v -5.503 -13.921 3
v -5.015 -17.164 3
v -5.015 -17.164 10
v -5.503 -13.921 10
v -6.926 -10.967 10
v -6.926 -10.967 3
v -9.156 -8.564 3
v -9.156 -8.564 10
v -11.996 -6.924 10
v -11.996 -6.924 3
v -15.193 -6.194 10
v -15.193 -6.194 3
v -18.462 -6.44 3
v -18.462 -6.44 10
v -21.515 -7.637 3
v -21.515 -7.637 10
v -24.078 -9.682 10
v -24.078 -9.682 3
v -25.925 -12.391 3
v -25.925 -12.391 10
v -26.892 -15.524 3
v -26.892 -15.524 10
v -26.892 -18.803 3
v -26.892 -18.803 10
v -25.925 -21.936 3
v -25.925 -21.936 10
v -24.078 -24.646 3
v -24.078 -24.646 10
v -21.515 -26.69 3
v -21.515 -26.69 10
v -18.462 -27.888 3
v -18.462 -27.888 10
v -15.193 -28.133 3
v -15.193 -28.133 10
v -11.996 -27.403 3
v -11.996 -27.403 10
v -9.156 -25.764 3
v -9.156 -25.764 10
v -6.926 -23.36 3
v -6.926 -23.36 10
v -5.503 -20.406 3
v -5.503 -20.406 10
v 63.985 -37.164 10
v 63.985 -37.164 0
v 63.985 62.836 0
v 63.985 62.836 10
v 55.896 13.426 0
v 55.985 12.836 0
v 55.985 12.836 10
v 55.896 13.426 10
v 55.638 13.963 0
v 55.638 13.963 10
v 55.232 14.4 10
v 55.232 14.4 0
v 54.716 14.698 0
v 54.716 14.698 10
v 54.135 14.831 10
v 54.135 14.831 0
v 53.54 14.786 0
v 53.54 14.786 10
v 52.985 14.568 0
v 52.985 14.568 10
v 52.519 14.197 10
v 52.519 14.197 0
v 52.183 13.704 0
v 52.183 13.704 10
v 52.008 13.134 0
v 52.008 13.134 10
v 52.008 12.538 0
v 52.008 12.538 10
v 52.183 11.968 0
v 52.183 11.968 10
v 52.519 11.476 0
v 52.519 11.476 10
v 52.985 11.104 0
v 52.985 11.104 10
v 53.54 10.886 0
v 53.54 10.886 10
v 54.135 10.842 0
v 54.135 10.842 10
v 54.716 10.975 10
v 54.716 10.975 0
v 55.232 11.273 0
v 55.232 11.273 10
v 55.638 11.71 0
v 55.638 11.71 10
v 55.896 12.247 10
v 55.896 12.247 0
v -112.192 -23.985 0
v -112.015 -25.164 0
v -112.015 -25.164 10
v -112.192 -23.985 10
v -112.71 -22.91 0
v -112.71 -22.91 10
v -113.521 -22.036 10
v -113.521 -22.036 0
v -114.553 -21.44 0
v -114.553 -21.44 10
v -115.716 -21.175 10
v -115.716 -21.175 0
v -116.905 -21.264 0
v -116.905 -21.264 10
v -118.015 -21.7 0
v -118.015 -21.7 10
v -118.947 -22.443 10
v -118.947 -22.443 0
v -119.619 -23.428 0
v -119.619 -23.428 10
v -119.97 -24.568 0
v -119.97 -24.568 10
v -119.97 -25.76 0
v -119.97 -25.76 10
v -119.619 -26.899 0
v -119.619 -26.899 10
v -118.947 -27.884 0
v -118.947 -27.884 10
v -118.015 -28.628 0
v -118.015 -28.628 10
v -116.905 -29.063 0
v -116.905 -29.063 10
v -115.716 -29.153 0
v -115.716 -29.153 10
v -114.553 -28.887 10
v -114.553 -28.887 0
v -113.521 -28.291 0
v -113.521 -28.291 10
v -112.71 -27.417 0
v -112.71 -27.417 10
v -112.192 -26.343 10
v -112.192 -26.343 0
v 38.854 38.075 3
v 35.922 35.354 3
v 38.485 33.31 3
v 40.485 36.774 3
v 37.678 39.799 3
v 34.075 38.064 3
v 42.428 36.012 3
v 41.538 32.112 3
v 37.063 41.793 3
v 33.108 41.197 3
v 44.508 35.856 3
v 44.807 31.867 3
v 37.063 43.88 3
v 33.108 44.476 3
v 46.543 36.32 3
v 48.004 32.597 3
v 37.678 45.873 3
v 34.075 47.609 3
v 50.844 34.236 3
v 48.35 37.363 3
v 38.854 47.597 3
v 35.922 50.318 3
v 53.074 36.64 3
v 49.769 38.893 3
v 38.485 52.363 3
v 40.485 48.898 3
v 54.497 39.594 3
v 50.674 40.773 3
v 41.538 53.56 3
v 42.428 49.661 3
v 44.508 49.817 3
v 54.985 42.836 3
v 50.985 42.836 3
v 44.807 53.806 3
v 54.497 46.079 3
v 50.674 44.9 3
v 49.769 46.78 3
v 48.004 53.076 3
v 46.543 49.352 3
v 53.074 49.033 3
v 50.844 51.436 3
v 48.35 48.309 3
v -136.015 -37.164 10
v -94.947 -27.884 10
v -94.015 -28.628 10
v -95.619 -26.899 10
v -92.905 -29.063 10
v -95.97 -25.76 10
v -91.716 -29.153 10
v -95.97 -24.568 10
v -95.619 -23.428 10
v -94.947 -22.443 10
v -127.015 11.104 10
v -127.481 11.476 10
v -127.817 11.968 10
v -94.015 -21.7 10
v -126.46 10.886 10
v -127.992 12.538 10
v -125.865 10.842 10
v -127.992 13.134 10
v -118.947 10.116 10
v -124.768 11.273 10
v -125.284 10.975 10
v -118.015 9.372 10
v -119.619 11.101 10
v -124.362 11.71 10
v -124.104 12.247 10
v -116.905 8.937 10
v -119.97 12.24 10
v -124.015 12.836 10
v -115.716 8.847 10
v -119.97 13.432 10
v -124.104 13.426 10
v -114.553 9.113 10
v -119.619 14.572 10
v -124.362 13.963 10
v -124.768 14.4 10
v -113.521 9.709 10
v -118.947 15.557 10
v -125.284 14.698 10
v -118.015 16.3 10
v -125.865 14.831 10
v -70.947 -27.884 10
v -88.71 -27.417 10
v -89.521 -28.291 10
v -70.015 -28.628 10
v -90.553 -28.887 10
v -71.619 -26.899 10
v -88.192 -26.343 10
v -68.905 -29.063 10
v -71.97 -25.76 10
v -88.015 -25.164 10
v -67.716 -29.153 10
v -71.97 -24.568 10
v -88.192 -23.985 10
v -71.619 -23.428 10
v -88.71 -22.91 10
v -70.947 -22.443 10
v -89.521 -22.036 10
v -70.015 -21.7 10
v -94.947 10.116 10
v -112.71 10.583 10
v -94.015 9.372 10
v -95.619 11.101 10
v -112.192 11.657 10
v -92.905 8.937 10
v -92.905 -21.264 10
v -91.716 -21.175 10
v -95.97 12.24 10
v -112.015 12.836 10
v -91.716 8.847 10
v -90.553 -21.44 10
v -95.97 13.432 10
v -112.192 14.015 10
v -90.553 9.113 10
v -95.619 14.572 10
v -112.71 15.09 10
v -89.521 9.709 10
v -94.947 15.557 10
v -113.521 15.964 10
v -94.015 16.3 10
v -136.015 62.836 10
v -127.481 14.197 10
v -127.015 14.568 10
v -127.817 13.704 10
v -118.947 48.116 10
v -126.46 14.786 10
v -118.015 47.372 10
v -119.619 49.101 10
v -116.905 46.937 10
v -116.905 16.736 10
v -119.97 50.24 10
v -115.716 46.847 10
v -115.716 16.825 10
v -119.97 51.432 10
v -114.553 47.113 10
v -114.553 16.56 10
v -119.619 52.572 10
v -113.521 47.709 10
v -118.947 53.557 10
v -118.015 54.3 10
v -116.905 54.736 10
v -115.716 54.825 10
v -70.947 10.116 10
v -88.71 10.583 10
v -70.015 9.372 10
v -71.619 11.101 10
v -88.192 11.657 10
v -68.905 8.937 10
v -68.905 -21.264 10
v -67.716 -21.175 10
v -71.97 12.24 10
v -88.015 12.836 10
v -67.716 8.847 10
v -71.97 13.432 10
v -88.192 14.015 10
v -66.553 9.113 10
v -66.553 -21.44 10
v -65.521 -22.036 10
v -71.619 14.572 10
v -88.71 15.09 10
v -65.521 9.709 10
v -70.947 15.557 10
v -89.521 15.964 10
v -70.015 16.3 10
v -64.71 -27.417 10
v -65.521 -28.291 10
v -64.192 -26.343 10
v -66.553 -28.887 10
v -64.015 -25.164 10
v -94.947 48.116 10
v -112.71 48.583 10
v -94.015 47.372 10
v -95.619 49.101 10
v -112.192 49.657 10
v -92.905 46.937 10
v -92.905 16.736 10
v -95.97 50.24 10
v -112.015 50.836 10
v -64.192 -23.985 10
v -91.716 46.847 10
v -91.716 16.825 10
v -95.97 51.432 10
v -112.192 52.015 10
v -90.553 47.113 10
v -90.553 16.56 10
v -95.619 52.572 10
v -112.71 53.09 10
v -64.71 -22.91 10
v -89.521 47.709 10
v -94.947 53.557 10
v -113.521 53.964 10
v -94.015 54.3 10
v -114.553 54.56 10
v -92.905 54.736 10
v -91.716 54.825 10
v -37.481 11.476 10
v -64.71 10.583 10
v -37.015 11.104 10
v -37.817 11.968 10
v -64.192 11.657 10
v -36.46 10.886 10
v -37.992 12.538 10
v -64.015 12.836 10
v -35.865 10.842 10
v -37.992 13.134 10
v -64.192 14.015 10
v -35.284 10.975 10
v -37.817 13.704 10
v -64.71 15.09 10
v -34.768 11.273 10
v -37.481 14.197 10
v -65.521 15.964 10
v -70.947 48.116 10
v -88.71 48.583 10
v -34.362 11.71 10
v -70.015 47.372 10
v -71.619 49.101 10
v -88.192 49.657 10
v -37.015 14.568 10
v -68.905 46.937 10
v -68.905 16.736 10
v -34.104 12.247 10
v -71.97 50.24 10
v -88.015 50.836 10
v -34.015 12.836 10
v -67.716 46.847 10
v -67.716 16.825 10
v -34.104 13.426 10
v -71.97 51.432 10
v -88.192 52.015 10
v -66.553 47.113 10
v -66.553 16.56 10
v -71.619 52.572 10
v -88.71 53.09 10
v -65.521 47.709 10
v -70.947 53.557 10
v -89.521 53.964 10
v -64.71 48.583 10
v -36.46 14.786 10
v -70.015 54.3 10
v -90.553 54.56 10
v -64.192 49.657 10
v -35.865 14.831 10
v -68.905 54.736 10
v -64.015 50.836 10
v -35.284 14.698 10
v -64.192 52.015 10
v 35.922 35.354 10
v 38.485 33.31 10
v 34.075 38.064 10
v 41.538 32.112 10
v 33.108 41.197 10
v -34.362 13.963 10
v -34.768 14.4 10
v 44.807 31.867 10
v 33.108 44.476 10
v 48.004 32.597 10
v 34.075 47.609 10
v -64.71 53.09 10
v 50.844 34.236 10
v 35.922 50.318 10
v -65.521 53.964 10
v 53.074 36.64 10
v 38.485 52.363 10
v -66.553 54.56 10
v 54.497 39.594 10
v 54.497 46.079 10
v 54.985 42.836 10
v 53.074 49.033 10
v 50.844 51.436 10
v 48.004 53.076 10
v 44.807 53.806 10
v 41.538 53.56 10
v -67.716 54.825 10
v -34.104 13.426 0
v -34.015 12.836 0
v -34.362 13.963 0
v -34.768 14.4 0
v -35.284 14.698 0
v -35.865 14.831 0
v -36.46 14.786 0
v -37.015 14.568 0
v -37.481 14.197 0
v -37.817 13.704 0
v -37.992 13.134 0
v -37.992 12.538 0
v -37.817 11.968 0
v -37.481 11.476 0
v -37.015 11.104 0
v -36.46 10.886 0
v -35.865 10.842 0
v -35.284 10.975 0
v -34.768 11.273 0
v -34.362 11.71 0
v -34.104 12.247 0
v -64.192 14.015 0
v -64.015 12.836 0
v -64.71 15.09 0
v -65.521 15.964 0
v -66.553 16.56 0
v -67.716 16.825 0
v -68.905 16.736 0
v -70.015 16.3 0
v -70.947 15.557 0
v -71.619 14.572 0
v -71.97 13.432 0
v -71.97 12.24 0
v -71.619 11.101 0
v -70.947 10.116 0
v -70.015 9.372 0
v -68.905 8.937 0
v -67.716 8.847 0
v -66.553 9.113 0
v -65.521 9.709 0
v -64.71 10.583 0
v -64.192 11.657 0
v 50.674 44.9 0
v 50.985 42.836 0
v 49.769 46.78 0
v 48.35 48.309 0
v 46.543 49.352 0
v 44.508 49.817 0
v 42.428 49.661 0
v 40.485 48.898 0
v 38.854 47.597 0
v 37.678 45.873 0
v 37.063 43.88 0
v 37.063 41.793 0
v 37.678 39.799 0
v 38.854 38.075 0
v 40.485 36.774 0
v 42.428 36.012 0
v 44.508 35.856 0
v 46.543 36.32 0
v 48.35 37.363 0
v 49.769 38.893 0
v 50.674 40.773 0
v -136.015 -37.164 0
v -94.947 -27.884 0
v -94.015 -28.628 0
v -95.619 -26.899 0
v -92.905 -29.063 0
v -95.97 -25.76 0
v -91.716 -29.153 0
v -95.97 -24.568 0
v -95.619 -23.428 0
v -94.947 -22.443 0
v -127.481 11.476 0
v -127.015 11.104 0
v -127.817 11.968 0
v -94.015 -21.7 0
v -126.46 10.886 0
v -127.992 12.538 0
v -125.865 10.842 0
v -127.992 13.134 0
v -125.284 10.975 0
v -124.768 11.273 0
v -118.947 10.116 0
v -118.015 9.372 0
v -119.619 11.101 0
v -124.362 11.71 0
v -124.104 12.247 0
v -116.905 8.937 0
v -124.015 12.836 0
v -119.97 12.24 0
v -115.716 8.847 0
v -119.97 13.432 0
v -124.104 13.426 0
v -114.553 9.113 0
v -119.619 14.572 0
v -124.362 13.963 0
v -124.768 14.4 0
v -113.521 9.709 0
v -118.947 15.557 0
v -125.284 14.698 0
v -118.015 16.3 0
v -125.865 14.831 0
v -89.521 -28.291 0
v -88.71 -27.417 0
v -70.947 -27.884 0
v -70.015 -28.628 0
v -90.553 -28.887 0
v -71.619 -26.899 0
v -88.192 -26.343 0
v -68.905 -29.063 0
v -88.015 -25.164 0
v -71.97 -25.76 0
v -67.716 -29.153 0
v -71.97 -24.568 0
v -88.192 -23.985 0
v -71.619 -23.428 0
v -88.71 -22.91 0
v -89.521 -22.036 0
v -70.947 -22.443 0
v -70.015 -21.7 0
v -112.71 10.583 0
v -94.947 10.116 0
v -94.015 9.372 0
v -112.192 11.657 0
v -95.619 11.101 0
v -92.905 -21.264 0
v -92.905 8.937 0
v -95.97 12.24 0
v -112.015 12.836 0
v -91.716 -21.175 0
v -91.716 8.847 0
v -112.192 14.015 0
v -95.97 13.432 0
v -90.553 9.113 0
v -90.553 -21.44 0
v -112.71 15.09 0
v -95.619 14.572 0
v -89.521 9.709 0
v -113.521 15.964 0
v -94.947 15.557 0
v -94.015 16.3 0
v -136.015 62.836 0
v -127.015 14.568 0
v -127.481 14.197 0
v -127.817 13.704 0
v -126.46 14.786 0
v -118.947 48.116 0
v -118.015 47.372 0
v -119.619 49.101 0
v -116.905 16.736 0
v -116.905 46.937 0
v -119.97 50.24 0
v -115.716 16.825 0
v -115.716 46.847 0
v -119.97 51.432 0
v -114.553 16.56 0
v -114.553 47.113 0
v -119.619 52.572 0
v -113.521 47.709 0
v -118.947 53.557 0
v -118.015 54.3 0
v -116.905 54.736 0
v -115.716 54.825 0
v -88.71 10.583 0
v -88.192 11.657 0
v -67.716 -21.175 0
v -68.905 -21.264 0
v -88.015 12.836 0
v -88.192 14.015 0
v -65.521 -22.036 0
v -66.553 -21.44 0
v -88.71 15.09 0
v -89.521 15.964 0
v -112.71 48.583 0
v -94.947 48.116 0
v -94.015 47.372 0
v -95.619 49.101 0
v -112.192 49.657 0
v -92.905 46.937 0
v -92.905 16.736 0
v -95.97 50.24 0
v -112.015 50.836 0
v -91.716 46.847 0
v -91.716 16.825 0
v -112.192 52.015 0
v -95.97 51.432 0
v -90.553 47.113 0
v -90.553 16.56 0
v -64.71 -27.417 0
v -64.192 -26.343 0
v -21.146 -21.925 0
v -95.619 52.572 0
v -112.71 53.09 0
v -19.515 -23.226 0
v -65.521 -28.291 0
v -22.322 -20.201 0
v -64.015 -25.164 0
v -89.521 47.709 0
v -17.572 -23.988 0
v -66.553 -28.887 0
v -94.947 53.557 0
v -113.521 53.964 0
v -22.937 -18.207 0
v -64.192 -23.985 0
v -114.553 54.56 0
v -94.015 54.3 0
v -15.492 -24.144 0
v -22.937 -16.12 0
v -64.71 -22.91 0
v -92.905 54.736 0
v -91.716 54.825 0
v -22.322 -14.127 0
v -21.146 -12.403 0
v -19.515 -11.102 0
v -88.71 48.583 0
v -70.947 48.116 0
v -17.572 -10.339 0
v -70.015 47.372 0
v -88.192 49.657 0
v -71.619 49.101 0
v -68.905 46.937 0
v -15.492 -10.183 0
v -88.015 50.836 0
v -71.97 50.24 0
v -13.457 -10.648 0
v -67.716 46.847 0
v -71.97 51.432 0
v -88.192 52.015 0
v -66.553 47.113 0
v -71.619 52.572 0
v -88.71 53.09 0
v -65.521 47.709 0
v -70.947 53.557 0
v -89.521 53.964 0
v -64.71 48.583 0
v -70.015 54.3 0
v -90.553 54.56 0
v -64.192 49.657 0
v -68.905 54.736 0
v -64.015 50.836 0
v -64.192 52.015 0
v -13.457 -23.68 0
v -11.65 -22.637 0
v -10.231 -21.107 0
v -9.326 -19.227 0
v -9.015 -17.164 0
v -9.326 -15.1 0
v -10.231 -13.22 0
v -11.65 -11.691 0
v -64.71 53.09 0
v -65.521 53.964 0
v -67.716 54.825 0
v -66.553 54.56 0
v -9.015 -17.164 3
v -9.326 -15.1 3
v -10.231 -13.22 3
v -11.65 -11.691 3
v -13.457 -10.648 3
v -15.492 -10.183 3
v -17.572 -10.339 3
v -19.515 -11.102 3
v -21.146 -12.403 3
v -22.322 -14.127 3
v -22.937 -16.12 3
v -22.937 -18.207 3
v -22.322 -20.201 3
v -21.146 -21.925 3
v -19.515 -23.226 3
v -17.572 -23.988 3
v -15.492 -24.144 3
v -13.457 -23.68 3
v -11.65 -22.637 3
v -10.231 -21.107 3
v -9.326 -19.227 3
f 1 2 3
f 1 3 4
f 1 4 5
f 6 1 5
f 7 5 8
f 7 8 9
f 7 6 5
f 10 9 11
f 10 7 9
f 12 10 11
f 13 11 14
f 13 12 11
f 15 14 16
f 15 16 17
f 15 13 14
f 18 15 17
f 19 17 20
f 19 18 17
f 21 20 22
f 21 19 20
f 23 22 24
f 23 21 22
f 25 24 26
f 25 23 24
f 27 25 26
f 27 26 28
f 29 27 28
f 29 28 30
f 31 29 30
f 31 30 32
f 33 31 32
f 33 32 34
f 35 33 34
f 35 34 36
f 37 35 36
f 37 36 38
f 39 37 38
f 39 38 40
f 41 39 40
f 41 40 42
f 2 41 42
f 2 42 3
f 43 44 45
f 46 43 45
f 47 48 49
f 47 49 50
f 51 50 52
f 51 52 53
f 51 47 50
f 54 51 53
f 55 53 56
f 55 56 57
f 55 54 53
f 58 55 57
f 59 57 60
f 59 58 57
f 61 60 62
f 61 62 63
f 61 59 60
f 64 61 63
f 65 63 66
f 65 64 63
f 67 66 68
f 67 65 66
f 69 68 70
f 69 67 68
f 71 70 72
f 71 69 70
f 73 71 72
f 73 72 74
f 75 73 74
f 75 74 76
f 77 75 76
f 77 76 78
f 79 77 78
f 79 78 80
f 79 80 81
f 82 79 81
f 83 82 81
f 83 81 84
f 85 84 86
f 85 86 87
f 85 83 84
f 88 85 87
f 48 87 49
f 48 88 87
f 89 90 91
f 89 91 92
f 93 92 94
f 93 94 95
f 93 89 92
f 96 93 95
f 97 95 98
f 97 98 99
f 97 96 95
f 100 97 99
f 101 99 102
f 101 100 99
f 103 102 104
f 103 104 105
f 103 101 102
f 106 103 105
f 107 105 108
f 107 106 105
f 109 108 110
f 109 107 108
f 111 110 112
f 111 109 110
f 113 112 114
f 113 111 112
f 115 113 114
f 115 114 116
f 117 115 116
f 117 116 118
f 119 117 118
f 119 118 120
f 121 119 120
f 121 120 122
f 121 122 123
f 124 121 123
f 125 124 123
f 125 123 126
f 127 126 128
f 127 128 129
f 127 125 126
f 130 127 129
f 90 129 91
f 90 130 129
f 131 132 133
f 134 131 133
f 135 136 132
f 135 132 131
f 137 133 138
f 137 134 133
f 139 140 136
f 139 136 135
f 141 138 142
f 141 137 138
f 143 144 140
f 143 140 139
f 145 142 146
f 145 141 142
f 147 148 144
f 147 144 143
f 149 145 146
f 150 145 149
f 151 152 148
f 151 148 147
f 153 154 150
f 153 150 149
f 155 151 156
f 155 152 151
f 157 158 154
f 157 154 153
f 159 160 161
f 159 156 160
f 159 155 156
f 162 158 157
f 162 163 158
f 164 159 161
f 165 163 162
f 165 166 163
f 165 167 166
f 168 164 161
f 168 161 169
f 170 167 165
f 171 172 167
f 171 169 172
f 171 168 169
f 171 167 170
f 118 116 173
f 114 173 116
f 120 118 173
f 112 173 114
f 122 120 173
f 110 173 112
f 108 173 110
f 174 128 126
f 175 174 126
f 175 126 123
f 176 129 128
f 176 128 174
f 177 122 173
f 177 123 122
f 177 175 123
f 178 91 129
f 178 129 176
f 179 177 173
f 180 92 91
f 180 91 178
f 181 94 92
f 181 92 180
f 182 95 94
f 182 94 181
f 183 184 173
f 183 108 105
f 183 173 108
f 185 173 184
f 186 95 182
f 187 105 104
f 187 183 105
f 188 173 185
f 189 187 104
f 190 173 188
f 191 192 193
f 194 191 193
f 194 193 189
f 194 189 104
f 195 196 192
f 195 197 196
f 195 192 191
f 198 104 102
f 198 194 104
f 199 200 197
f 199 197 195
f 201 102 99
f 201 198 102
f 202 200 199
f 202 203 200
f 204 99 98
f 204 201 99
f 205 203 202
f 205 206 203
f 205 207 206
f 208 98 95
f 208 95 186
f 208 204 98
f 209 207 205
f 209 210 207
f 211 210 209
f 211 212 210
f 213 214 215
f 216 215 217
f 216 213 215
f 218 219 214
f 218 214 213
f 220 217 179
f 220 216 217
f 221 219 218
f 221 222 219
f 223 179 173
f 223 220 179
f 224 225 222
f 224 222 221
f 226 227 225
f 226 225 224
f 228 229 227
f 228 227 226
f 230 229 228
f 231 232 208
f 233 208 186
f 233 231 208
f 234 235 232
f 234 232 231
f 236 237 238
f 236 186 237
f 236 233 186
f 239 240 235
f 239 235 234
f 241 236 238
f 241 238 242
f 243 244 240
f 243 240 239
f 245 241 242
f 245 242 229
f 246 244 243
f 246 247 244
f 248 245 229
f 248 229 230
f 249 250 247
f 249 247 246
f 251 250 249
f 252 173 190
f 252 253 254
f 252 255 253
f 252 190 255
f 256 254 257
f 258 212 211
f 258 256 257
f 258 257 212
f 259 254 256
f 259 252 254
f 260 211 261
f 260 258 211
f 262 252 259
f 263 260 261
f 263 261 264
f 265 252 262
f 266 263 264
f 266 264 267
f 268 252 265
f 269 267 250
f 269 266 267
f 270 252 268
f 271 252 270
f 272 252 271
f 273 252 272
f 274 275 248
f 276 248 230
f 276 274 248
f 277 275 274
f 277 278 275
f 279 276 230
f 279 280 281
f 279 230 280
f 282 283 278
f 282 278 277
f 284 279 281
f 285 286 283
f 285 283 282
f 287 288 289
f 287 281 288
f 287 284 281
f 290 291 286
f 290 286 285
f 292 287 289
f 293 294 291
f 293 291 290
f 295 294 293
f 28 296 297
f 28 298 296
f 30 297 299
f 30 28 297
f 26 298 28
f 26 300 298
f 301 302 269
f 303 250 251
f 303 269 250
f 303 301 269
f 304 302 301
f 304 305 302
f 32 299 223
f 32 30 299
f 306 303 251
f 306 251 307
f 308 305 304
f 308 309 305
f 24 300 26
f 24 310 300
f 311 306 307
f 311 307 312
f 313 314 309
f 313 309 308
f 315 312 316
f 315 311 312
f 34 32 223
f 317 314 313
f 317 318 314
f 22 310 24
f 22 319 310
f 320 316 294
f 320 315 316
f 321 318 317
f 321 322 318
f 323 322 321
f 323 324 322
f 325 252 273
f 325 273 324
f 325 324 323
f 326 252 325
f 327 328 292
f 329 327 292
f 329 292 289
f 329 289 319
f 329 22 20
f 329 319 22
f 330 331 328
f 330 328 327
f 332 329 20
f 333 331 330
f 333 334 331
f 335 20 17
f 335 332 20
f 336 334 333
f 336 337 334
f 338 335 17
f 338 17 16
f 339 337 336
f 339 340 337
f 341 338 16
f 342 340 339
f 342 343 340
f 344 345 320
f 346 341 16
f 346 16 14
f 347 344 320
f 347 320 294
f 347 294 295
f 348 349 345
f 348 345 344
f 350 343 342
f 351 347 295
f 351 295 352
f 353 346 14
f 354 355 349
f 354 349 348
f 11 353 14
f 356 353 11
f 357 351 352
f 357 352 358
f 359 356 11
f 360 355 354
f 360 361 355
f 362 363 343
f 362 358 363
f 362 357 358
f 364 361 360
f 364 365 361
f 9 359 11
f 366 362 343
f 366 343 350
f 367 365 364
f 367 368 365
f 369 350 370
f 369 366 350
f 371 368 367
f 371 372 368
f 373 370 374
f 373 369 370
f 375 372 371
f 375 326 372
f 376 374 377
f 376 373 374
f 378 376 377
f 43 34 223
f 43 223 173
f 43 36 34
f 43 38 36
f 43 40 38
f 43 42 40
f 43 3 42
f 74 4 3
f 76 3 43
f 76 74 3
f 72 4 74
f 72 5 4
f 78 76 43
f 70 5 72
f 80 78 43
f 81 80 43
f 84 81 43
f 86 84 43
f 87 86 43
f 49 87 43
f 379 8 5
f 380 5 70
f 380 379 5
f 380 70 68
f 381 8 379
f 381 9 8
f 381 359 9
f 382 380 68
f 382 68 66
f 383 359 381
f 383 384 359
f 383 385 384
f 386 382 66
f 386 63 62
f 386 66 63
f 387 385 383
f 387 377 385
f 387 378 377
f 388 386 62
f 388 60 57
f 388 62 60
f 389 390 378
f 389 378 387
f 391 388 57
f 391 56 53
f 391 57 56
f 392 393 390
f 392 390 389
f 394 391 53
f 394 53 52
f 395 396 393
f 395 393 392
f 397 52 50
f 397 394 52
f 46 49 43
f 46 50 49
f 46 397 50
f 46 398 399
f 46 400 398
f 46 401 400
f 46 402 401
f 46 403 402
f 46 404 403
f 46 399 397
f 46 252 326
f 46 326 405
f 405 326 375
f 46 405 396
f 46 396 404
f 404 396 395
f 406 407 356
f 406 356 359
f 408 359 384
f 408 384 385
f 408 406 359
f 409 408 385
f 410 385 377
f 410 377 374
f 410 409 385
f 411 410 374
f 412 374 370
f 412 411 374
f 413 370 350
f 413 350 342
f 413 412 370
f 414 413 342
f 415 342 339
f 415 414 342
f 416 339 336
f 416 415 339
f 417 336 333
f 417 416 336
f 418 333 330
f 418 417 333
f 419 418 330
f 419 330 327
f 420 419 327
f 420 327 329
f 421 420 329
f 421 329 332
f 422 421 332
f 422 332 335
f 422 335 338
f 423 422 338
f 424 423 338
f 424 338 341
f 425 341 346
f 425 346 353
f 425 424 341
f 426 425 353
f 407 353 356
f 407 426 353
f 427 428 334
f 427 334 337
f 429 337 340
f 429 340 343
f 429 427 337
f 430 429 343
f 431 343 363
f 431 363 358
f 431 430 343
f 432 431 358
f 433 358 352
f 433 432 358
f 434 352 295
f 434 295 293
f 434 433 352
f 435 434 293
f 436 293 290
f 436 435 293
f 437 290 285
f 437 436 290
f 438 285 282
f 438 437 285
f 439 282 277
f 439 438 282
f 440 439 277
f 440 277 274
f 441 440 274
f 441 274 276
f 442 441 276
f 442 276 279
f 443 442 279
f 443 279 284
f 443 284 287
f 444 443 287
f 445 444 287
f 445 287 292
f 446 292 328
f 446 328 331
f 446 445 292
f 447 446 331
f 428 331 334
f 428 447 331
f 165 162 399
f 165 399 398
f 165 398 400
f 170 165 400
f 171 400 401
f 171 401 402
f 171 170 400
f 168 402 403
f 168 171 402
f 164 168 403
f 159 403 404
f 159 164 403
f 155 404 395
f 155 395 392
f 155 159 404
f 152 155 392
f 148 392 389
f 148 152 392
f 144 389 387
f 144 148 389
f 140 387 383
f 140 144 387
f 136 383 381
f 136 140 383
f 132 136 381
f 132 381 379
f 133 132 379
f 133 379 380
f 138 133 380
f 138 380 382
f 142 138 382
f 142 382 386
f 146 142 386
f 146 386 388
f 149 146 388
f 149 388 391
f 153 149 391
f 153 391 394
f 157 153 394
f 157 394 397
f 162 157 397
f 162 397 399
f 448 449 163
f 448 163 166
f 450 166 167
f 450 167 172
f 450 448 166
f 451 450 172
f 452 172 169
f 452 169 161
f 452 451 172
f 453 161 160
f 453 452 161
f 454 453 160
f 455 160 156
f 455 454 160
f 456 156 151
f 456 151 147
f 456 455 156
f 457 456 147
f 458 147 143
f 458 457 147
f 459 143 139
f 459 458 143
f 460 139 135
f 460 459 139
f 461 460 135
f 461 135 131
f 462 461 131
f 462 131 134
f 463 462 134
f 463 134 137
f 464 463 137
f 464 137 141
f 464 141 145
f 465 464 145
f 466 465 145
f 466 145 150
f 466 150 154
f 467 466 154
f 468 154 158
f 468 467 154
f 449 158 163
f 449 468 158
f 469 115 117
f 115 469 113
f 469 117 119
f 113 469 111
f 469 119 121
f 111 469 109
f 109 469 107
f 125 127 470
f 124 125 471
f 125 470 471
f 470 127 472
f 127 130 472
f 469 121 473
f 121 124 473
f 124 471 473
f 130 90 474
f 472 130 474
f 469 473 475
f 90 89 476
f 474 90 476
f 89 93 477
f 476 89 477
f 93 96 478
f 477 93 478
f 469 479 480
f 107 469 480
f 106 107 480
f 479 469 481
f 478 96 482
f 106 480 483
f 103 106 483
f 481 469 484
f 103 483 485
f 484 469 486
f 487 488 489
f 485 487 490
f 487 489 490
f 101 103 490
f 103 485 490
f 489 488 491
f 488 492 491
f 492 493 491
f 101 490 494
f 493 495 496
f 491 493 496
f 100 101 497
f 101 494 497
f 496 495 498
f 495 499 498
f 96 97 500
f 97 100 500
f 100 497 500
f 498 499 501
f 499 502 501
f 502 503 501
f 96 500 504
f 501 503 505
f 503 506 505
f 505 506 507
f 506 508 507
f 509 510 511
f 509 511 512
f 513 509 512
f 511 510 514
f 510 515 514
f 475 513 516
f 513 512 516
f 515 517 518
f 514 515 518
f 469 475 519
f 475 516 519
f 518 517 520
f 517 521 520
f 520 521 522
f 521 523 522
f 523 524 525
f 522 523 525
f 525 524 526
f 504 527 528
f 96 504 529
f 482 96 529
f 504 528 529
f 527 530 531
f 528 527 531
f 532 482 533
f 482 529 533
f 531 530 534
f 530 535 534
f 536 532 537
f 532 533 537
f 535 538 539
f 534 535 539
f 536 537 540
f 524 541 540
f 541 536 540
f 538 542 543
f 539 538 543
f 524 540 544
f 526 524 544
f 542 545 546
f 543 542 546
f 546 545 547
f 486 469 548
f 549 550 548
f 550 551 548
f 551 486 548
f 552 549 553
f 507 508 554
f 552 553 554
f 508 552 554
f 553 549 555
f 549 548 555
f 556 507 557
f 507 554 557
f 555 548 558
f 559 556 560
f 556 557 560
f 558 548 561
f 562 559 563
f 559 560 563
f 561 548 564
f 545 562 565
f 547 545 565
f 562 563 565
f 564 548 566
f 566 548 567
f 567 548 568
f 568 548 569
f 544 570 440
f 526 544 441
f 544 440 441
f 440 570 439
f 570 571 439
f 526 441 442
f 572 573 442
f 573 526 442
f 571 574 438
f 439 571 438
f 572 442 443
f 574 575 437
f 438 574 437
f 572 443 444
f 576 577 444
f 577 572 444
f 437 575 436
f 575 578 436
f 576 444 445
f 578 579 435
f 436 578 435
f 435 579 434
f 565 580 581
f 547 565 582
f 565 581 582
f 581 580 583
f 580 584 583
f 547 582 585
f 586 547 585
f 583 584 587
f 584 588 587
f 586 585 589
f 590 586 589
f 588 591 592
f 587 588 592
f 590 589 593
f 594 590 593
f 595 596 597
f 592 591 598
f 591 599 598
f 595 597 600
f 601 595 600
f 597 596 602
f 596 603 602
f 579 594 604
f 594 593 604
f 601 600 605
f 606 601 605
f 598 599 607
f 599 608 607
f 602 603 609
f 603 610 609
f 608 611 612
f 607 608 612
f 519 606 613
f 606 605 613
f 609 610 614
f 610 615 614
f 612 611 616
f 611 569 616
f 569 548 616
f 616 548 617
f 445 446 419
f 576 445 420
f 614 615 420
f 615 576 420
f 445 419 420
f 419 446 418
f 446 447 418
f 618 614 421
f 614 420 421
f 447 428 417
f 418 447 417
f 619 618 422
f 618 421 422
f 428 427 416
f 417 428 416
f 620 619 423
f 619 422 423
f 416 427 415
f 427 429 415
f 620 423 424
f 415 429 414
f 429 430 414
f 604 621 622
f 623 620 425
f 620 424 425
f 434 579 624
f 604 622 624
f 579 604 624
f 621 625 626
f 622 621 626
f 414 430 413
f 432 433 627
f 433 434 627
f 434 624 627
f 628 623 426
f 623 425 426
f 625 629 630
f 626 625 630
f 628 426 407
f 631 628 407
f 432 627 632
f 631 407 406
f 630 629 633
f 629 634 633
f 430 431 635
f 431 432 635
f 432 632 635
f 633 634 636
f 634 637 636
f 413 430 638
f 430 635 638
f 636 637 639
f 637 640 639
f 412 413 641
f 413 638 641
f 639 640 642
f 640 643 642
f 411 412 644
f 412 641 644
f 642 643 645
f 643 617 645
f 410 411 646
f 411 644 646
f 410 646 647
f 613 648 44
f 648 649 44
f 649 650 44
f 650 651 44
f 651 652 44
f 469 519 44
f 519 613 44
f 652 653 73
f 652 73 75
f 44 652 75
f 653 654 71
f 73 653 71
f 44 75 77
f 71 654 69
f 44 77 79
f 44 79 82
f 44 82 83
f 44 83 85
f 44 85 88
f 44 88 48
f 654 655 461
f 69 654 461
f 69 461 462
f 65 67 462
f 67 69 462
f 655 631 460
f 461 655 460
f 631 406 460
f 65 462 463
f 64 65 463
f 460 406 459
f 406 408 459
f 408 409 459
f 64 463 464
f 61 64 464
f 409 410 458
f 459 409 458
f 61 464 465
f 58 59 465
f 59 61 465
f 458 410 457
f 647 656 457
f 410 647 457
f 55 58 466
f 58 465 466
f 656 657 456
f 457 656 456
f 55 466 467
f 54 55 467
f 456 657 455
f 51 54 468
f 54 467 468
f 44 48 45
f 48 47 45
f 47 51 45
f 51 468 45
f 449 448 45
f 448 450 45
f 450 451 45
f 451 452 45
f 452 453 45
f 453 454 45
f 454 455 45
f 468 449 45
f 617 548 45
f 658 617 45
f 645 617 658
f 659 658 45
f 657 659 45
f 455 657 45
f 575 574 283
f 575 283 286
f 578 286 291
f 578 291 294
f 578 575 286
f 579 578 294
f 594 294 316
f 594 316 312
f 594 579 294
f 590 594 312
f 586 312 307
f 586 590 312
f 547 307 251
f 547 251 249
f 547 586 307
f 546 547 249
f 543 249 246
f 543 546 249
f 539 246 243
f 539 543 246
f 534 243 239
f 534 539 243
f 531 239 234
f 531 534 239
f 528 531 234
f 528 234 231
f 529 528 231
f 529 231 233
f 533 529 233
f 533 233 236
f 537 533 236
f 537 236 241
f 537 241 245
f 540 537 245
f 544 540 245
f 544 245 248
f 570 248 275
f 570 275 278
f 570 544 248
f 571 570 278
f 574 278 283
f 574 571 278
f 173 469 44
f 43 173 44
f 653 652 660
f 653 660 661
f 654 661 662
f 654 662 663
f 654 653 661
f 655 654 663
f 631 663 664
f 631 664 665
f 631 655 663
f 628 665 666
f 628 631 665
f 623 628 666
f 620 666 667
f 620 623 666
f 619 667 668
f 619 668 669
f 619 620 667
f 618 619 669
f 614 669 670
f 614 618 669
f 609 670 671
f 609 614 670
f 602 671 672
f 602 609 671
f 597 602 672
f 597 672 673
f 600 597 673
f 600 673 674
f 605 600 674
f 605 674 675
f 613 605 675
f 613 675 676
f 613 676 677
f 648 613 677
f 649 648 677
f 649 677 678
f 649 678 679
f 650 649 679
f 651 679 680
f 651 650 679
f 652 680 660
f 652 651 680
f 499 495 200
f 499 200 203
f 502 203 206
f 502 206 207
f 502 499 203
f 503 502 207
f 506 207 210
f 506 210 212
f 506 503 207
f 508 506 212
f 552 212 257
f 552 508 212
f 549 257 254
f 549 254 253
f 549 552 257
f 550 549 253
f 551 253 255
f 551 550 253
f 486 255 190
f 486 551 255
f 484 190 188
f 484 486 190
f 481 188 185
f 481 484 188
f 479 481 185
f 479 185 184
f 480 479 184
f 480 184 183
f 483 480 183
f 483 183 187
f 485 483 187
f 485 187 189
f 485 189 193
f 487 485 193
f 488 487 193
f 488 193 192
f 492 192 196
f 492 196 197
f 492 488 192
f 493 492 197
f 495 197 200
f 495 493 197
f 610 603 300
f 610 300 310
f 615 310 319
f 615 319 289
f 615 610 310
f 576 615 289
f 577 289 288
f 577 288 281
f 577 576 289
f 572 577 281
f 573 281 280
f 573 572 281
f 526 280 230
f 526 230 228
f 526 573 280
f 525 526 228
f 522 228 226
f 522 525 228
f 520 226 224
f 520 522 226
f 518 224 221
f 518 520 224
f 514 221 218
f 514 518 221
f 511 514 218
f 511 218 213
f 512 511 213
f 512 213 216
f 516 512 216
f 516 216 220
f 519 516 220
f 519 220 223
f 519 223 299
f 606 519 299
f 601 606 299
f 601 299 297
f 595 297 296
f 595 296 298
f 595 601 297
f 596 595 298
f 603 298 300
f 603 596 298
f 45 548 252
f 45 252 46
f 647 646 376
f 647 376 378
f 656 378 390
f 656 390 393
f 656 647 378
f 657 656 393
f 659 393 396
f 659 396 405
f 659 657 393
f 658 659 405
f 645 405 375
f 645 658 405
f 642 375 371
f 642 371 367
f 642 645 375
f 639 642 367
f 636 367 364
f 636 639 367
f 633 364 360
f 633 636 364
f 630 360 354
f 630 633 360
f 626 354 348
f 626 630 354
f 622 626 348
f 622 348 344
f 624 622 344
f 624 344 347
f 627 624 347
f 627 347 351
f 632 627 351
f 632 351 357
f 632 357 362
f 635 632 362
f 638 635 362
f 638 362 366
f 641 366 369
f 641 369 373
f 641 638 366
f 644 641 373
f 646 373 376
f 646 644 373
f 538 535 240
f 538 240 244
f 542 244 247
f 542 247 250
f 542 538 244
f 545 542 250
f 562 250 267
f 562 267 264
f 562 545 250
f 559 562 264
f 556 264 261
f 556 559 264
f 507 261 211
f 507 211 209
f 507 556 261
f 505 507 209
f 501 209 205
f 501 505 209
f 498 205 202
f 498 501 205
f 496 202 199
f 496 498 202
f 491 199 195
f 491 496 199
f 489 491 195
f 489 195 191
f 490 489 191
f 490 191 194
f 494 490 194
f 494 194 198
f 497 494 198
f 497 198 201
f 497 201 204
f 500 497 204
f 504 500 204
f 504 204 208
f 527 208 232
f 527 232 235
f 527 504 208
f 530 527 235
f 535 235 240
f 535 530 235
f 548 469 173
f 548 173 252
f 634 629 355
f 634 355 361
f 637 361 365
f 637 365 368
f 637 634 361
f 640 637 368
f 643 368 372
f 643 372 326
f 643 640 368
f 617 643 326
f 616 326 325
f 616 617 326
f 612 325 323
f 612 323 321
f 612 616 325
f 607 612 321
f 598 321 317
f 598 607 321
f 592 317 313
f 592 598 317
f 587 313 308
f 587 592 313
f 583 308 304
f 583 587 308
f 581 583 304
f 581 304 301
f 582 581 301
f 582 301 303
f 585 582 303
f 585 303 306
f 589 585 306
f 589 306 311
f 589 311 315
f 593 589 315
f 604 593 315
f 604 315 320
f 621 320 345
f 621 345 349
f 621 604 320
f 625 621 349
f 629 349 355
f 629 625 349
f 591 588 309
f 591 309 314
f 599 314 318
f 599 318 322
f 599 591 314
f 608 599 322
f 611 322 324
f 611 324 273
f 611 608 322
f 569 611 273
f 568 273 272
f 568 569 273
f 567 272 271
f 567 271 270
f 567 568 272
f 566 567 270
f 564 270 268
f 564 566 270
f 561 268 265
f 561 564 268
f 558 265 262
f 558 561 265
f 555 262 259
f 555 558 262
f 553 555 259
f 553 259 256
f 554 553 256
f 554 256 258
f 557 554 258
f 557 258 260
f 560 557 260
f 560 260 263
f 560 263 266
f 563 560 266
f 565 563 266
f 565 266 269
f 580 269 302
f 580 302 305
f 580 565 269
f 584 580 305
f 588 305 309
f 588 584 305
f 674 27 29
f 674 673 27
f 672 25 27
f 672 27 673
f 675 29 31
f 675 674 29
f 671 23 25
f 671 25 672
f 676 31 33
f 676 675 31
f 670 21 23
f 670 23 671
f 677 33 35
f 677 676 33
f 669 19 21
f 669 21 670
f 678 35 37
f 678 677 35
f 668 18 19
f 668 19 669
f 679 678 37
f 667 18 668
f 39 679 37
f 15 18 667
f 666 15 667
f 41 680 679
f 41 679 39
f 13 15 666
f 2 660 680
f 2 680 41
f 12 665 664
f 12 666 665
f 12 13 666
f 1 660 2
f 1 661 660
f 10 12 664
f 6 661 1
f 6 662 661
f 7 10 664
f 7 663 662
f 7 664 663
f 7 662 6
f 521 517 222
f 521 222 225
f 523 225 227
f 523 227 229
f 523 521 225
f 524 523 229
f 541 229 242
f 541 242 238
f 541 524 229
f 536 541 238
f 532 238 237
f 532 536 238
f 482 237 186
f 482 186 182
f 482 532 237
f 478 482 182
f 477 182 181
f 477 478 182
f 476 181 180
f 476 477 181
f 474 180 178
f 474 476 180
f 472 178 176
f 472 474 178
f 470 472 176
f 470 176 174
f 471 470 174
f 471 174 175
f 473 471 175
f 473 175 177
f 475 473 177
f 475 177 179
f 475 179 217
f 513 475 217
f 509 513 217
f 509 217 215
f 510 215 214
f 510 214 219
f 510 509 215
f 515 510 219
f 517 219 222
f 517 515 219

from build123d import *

# Parameters (mm, degrees)
F0_W     = 200
F0_H     = 100
F0_R     = 4
F0_R_2   = 11
F0_R_3   = 2
F1_DEPTH = 10
F0_R_4   = 7
F2_DEPTH = 3


with BuildPart() as f1:
    # F0 (on Top) → F1 (new body)
    with BuildSketch(Plane.XY):
        with Locations((-36.014734, 12.836266)):
            Rectangle(F0_W, F0_H)
        with Locations((-116.014734, -25.163734)):
            Circle(F0_R, mode=Mode.SUBTRACT)
        with Locations((-92.014734, -25.163734)):
            Circle(F0_R, mode=Mode.SUBTRACT)
        with Locations((-68.014734, -25.163734)):
            Circle(F0_R, mode=Mode.SUBTRACT)
        with Locations((-16.014734, -17.163734)):
            Circle(F0_R_2, mode=Mode.SUBTRACT)
        with Locations((-126.014734, 12.836266)):
            Circle(F0_R_3, mode=Mode.SUBTRACT)
        with Locations((-116.014734, 12.836266)):
            Circle(F0_R, mode=Mode.SUBTRACT)
        with Locations((-92.014734, 12.836266)):
            Circle(F0_R, mode=Mode.SUBTRACT)
        with Locations((-68.014734, 12.836266)):
            Circle(F0_R, mode=Mode.SUBTRACT)
        with Locations((-116.014734, 50.836266)):
            Circle(F0_R, mode=Mode.SUBTRACT)
        with Locations((-92.014734, 50.836266)):
            Circle(F0_R, mode=Mode.SUBTRACT)
        with Locations((-68.014734, 50.836266)):
            Circle(F0_R, mode=Mode.SUBTRACT)
        with Locations((-36.014734, 12.836266)):
            Circle(F0_R_3, mode=Mode.SUBTRACT)
        with Locations((53.985266, 12.836266)):
            Circle(F0_R_3, mode=Mode.SUBTRACT)
        with Locations((43.985266, 42.836266)):
            Circle(F0_R_2, mode=Mode.SUBTRACT)
    extrude(amount=F1_DEPTH)

    # F0 (on Top) → F2 (join)
    with BuildSketch(Plane.XY):
        with Locations((-16.014734, -17.163734)):
            Circle(F0_R_2)
        with Locations((-16.014734, -17.163734)):
            Circle(F0_R_4, mode=Mode.SUBTRACT)
        with Locations((43.985266, 42.836266)):
            Circle(F0_R_2)
        with Locations((43.985266, 42.836266)):
            Circle(F0_R_4, mode=Mode.SUBTRACT)
    extrude(amount=F2_DEPTH)


solid = f1.part
